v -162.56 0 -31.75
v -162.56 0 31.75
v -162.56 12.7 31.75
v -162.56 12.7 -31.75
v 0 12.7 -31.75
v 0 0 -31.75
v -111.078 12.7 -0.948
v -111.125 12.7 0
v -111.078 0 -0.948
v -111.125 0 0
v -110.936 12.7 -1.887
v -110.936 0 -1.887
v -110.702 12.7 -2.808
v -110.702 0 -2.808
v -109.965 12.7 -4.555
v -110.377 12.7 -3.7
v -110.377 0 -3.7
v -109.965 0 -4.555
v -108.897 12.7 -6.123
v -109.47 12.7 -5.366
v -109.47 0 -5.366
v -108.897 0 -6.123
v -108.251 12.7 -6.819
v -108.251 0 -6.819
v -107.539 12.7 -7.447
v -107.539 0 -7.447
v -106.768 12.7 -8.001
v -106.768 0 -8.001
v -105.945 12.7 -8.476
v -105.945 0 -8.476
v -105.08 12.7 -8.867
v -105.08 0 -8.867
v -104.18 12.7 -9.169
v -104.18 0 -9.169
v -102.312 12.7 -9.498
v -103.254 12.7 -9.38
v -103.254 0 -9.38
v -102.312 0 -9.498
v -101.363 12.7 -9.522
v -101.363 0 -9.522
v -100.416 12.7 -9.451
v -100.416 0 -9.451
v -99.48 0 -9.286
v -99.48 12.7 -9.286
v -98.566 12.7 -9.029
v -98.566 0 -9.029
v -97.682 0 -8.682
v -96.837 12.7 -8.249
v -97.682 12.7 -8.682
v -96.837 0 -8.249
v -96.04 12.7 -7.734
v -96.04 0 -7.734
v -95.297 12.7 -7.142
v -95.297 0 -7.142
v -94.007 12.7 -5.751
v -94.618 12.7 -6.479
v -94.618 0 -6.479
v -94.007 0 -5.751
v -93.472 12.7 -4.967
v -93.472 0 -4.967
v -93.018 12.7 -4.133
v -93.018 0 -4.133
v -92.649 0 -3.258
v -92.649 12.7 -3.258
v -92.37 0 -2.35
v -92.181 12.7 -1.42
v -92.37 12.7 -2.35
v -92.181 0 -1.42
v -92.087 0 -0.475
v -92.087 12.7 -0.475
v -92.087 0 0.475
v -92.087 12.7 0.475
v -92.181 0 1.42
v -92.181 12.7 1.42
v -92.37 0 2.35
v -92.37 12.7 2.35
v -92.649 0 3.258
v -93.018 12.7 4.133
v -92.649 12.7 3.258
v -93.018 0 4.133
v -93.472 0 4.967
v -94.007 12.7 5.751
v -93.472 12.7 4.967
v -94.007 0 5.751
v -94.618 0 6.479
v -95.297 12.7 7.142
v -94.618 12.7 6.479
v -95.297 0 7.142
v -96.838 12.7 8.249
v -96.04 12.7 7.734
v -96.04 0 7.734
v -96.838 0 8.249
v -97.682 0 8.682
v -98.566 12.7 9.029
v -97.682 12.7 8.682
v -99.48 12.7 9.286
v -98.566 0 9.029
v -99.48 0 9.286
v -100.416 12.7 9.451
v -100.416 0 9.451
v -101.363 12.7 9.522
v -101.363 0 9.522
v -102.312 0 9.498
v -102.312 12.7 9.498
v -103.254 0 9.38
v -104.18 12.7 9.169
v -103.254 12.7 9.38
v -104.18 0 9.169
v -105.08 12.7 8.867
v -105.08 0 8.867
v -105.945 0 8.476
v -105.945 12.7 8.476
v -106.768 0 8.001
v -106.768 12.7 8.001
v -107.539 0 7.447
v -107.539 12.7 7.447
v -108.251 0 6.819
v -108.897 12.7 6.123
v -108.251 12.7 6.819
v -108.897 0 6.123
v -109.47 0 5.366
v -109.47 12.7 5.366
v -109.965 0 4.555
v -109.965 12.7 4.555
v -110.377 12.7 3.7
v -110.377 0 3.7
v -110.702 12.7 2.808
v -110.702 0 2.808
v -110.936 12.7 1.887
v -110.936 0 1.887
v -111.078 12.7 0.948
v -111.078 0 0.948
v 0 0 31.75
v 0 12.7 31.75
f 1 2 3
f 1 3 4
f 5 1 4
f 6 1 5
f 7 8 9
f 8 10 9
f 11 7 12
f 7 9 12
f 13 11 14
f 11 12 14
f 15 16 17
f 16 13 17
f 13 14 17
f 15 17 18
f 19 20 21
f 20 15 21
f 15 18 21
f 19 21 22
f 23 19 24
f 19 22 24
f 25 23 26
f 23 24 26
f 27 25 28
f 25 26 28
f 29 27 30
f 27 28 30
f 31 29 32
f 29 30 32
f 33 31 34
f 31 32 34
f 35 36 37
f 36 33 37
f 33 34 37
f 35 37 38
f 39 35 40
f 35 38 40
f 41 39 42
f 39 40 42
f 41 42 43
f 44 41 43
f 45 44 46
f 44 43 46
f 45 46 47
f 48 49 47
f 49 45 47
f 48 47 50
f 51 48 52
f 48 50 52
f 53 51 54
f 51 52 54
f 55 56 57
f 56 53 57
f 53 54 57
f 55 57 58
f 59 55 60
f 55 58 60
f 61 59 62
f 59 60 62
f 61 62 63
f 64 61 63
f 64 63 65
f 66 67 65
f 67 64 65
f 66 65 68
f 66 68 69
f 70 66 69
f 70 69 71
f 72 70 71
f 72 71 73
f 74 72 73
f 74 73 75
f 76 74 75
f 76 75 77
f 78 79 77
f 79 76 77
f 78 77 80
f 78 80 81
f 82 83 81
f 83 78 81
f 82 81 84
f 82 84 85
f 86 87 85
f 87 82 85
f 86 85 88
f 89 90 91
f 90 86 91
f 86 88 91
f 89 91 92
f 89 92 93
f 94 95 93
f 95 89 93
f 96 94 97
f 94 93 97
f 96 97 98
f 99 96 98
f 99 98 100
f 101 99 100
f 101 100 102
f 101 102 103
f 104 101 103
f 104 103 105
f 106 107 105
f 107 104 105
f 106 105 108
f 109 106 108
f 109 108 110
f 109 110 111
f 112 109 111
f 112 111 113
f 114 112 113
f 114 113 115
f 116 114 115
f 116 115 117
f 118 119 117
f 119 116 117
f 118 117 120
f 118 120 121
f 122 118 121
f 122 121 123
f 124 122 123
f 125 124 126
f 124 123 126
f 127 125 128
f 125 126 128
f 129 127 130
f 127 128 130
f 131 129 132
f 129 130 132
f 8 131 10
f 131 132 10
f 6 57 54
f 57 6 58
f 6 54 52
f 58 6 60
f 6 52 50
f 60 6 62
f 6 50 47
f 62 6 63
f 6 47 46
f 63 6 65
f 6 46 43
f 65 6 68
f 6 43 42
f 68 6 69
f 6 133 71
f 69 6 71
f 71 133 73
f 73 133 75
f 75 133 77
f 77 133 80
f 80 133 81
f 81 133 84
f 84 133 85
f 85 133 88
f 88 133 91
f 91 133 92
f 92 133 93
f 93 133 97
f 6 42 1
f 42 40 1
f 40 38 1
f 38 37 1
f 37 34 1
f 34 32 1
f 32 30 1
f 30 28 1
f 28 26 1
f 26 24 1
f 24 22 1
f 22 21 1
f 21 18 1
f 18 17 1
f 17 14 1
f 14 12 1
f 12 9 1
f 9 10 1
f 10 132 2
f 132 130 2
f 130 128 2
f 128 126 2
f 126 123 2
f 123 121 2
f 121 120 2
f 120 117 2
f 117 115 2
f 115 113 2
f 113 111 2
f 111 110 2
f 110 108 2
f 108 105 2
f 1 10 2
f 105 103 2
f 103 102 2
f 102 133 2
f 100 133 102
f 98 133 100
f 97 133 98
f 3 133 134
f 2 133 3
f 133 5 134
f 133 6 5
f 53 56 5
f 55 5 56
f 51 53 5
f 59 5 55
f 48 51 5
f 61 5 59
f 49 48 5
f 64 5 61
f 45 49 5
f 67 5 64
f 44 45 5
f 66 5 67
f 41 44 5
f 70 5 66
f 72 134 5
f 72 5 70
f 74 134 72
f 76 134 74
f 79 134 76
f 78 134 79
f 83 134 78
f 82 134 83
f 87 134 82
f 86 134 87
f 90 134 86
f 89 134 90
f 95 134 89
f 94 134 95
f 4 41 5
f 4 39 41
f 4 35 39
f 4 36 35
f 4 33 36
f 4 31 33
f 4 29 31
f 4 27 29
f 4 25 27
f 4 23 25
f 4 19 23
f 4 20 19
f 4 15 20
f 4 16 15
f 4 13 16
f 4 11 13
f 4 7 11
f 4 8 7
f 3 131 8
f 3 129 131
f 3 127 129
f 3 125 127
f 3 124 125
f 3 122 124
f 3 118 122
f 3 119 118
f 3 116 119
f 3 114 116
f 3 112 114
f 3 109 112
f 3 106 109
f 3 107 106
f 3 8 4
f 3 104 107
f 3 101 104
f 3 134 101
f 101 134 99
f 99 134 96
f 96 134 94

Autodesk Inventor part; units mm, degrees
ref_plane "YZ Plane" through (0, 0, 0) normal (1, 0, 0) x (0, 1, 0)
ref_plane "XZ Plane" through (0, 0, 0) normal (0, 1, 0) x (-1, 0, 0)
ref_plane "XY Plane" through (0, 0, 0) normal (0, 0, 1) x (1, 0, 0)
sketch "Sketch1" plane through (0, 0, 0) normal (0, 1, 0) x (-1, 0, 0)
  line L0 (0, 31.75) -> (162.56, 31.75)
  line L1 (162.56, 31.75) -> (162.56, -31.75)
  line L2 (162.56, -31.75) -> (0, -31.75)
  line L3 (0, -31.75) -> (0, 31.75)
  circle A0 centre (101.6, 0) radius 9.525
  point P0 (0, 0)
  point P1 (0, 0)
  dimension "d0" = 162.56
  dimension "d1" = 63.5
  dimension "d5" = 19.05
  dimension "d6" = 60.96
  dimension "d7" = 31.75
extrude "Extrusion1" add sketch "Sketch1" along normal blind 12.7
properties part number "Part3 x 2"
